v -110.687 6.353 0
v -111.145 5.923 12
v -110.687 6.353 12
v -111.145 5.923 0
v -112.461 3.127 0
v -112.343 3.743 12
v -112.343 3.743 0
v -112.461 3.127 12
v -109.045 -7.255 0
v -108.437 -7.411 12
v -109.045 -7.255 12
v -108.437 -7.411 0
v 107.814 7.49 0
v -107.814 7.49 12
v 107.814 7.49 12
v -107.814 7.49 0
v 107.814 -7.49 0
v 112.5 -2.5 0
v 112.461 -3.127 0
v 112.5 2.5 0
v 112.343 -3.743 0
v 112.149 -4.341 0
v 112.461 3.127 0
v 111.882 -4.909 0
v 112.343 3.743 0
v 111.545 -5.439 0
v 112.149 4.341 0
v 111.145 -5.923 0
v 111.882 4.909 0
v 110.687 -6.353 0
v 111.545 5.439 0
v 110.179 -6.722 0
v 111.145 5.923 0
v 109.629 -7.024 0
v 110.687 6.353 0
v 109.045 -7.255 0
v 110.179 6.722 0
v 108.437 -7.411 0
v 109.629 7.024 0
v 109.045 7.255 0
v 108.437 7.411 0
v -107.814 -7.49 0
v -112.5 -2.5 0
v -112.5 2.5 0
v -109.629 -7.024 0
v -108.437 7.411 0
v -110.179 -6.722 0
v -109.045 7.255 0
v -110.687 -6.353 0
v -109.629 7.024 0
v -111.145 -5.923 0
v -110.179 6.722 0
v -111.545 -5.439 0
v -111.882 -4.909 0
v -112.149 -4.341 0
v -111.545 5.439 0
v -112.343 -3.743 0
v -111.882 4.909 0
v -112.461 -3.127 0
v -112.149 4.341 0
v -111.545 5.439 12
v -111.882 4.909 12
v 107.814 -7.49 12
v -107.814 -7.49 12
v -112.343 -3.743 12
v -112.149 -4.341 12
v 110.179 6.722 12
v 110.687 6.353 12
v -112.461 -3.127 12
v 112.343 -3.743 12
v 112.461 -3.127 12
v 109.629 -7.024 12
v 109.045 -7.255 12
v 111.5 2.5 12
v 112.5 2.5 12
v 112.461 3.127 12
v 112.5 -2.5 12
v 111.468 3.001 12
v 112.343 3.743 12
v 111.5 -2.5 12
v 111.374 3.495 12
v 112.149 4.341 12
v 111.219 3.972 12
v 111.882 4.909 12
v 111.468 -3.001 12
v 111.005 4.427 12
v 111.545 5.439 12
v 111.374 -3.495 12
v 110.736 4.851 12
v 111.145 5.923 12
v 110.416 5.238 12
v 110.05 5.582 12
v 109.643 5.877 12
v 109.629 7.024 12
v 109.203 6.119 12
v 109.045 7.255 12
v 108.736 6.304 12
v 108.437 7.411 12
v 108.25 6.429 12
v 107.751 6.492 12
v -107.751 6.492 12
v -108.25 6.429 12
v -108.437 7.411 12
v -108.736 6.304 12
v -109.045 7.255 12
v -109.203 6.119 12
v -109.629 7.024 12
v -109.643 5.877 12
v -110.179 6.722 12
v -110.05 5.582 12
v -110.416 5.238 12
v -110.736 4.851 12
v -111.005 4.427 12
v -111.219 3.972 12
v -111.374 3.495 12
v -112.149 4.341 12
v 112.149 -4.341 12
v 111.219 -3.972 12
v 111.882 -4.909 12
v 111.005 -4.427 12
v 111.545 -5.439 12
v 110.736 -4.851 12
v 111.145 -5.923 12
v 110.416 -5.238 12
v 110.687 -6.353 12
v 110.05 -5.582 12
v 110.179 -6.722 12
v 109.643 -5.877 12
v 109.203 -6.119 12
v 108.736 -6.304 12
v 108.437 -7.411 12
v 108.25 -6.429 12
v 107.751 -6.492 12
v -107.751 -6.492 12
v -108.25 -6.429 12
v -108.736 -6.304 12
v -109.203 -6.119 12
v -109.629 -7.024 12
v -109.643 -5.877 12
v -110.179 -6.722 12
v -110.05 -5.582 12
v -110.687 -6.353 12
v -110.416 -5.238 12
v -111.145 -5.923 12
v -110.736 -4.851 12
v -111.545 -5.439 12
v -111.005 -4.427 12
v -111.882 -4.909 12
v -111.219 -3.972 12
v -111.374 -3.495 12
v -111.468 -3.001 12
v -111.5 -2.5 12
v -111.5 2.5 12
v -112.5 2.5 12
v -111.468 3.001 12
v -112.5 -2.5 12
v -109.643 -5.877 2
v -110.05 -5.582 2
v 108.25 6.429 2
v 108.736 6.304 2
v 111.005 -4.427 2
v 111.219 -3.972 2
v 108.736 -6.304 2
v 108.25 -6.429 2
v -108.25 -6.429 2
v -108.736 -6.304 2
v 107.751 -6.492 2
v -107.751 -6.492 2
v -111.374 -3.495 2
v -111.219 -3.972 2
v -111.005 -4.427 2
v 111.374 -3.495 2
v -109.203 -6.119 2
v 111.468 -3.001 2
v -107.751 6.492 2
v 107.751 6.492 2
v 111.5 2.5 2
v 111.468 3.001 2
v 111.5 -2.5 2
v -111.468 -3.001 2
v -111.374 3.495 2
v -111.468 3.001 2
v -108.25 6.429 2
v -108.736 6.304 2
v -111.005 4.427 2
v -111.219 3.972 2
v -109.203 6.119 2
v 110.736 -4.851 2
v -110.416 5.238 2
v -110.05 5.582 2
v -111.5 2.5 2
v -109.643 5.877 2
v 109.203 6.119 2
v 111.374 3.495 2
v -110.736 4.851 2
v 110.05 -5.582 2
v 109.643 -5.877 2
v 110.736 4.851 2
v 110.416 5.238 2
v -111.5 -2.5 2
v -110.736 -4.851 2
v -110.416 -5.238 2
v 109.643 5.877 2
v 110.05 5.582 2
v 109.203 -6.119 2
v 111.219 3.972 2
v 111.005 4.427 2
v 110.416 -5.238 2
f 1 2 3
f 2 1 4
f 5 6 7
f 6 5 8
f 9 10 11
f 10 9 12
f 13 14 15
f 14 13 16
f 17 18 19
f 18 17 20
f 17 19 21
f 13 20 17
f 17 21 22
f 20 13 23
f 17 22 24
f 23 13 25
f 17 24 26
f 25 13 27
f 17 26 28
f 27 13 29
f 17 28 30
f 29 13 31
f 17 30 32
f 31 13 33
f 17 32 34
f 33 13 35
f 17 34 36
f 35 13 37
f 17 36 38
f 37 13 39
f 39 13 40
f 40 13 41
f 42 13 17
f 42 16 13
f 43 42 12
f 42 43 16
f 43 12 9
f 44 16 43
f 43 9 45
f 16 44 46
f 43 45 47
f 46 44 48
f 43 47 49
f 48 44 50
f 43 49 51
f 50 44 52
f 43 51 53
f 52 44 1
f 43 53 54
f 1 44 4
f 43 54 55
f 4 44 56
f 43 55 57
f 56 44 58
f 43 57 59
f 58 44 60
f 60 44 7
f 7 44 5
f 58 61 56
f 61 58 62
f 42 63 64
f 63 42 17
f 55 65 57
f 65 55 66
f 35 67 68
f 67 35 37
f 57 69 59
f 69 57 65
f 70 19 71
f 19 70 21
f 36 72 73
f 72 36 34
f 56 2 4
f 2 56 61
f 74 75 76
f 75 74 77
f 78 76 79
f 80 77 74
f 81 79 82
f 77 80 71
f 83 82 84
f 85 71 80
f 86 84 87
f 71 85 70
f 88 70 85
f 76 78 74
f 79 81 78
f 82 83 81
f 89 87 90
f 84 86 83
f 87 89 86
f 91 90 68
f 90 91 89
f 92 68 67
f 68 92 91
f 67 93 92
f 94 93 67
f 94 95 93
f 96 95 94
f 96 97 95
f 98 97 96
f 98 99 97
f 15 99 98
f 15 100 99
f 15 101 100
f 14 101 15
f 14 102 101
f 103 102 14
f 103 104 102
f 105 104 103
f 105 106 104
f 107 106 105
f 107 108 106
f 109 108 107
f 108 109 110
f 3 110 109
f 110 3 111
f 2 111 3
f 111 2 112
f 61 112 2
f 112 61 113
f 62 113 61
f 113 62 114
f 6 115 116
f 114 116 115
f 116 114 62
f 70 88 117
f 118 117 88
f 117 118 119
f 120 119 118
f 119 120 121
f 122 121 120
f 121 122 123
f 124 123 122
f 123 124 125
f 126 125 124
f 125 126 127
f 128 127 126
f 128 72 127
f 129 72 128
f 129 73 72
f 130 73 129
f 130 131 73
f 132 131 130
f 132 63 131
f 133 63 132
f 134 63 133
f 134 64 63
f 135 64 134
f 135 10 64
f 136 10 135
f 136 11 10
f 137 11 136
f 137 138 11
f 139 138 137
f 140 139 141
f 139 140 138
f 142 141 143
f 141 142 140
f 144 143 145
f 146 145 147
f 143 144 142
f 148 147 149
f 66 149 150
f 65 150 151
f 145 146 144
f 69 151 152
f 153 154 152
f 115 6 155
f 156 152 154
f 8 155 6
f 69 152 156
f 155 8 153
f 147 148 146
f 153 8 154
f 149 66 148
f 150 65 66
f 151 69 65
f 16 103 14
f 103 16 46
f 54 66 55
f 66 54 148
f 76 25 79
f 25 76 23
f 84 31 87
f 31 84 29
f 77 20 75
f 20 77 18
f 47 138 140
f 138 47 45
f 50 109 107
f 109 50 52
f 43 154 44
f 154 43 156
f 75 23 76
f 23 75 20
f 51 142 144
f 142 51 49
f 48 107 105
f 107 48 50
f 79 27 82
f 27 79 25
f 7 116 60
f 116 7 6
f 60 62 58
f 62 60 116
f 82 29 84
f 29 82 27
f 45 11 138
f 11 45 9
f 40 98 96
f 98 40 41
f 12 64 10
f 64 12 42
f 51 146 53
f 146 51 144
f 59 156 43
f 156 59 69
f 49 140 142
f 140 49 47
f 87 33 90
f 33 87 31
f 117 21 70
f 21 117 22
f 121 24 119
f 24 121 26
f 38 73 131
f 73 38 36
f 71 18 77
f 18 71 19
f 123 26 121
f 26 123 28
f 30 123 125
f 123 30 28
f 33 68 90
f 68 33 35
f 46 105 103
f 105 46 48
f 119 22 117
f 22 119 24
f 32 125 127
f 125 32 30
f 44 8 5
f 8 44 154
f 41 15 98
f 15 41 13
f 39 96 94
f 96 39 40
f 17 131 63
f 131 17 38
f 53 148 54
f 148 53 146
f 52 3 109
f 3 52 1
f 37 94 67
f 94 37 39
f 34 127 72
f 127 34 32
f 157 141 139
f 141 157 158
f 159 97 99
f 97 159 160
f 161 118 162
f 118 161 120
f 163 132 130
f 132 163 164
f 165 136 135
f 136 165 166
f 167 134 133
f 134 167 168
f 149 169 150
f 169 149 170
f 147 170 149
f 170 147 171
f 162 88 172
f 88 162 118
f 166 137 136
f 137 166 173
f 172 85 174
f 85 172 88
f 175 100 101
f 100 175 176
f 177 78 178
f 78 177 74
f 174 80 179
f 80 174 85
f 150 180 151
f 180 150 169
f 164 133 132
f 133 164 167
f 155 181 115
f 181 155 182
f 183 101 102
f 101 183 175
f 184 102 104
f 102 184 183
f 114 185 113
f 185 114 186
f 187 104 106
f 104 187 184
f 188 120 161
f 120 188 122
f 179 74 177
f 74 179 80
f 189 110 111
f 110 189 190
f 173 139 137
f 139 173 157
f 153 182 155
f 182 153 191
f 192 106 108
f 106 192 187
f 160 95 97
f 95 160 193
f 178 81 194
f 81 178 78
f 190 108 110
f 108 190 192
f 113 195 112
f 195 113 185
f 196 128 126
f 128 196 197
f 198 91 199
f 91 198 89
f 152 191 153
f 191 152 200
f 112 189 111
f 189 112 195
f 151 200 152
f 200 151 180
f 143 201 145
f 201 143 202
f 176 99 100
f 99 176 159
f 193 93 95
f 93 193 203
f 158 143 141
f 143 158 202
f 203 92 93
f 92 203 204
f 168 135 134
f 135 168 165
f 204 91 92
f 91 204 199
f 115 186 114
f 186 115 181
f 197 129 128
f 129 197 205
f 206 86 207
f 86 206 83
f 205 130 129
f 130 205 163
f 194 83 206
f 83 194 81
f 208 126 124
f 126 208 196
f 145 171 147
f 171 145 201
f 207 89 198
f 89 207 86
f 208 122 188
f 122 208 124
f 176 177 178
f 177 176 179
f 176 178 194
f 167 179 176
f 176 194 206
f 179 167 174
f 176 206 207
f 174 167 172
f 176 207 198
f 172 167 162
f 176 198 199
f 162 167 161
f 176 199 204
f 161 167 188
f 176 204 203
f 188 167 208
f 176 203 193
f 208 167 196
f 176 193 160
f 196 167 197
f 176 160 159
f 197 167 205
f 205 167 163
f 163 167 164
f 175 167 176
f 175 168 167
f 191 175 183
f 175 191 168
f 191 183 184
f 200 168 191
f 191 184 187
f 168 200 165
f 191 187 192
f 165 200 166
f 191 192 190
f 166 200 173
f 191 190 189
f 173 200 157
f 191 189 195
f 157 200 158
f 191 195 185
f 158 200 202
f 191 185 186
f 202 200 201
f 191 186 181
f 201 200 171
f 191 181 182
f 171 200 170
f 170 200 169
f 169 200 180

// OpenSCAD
$fn = 50;


difference() {
	union() {
		hull() {
			translate(v = [-107.5000000000, 2.5000000000, 0]) {
				cylinder(h = 12, r = 5);
			}
			translate(v = [107.5000000000, 2.5000000000, 0]) {
				cylinder(h = 12, r = 5);
			}
			translate(v = [-107.5000000000, -2.5000000000, 0]) {
				cylinder(h = 12, r = 5);
			}
			translate(v = [107.5000000000, -2.5000000000, 0]) {
				cylinder(h = 12, r = 5);
			}
		}
	}
	union() {
		translate(v = [0, 0, 2]) {
			hull() {
				translate(v = [-107.5000000000, 2.5000000000, 0]) {
					cylinder(h = 10, r = 4);
				}
				translate(v = [107.5000000000, 2.5000000000, 0]) {
					cylinder(h = 10, r = 4);
				}
				translate(v = [-107.5000000000, -2.5000000000, 0]) {
					cylinder(h = 10, r = 4);
				}
				translate(v = [107.5000000000, -2.5000000000, 0]) {
					cylinder(h = 10, r = 4);
				}
			}
		}
	}
}
